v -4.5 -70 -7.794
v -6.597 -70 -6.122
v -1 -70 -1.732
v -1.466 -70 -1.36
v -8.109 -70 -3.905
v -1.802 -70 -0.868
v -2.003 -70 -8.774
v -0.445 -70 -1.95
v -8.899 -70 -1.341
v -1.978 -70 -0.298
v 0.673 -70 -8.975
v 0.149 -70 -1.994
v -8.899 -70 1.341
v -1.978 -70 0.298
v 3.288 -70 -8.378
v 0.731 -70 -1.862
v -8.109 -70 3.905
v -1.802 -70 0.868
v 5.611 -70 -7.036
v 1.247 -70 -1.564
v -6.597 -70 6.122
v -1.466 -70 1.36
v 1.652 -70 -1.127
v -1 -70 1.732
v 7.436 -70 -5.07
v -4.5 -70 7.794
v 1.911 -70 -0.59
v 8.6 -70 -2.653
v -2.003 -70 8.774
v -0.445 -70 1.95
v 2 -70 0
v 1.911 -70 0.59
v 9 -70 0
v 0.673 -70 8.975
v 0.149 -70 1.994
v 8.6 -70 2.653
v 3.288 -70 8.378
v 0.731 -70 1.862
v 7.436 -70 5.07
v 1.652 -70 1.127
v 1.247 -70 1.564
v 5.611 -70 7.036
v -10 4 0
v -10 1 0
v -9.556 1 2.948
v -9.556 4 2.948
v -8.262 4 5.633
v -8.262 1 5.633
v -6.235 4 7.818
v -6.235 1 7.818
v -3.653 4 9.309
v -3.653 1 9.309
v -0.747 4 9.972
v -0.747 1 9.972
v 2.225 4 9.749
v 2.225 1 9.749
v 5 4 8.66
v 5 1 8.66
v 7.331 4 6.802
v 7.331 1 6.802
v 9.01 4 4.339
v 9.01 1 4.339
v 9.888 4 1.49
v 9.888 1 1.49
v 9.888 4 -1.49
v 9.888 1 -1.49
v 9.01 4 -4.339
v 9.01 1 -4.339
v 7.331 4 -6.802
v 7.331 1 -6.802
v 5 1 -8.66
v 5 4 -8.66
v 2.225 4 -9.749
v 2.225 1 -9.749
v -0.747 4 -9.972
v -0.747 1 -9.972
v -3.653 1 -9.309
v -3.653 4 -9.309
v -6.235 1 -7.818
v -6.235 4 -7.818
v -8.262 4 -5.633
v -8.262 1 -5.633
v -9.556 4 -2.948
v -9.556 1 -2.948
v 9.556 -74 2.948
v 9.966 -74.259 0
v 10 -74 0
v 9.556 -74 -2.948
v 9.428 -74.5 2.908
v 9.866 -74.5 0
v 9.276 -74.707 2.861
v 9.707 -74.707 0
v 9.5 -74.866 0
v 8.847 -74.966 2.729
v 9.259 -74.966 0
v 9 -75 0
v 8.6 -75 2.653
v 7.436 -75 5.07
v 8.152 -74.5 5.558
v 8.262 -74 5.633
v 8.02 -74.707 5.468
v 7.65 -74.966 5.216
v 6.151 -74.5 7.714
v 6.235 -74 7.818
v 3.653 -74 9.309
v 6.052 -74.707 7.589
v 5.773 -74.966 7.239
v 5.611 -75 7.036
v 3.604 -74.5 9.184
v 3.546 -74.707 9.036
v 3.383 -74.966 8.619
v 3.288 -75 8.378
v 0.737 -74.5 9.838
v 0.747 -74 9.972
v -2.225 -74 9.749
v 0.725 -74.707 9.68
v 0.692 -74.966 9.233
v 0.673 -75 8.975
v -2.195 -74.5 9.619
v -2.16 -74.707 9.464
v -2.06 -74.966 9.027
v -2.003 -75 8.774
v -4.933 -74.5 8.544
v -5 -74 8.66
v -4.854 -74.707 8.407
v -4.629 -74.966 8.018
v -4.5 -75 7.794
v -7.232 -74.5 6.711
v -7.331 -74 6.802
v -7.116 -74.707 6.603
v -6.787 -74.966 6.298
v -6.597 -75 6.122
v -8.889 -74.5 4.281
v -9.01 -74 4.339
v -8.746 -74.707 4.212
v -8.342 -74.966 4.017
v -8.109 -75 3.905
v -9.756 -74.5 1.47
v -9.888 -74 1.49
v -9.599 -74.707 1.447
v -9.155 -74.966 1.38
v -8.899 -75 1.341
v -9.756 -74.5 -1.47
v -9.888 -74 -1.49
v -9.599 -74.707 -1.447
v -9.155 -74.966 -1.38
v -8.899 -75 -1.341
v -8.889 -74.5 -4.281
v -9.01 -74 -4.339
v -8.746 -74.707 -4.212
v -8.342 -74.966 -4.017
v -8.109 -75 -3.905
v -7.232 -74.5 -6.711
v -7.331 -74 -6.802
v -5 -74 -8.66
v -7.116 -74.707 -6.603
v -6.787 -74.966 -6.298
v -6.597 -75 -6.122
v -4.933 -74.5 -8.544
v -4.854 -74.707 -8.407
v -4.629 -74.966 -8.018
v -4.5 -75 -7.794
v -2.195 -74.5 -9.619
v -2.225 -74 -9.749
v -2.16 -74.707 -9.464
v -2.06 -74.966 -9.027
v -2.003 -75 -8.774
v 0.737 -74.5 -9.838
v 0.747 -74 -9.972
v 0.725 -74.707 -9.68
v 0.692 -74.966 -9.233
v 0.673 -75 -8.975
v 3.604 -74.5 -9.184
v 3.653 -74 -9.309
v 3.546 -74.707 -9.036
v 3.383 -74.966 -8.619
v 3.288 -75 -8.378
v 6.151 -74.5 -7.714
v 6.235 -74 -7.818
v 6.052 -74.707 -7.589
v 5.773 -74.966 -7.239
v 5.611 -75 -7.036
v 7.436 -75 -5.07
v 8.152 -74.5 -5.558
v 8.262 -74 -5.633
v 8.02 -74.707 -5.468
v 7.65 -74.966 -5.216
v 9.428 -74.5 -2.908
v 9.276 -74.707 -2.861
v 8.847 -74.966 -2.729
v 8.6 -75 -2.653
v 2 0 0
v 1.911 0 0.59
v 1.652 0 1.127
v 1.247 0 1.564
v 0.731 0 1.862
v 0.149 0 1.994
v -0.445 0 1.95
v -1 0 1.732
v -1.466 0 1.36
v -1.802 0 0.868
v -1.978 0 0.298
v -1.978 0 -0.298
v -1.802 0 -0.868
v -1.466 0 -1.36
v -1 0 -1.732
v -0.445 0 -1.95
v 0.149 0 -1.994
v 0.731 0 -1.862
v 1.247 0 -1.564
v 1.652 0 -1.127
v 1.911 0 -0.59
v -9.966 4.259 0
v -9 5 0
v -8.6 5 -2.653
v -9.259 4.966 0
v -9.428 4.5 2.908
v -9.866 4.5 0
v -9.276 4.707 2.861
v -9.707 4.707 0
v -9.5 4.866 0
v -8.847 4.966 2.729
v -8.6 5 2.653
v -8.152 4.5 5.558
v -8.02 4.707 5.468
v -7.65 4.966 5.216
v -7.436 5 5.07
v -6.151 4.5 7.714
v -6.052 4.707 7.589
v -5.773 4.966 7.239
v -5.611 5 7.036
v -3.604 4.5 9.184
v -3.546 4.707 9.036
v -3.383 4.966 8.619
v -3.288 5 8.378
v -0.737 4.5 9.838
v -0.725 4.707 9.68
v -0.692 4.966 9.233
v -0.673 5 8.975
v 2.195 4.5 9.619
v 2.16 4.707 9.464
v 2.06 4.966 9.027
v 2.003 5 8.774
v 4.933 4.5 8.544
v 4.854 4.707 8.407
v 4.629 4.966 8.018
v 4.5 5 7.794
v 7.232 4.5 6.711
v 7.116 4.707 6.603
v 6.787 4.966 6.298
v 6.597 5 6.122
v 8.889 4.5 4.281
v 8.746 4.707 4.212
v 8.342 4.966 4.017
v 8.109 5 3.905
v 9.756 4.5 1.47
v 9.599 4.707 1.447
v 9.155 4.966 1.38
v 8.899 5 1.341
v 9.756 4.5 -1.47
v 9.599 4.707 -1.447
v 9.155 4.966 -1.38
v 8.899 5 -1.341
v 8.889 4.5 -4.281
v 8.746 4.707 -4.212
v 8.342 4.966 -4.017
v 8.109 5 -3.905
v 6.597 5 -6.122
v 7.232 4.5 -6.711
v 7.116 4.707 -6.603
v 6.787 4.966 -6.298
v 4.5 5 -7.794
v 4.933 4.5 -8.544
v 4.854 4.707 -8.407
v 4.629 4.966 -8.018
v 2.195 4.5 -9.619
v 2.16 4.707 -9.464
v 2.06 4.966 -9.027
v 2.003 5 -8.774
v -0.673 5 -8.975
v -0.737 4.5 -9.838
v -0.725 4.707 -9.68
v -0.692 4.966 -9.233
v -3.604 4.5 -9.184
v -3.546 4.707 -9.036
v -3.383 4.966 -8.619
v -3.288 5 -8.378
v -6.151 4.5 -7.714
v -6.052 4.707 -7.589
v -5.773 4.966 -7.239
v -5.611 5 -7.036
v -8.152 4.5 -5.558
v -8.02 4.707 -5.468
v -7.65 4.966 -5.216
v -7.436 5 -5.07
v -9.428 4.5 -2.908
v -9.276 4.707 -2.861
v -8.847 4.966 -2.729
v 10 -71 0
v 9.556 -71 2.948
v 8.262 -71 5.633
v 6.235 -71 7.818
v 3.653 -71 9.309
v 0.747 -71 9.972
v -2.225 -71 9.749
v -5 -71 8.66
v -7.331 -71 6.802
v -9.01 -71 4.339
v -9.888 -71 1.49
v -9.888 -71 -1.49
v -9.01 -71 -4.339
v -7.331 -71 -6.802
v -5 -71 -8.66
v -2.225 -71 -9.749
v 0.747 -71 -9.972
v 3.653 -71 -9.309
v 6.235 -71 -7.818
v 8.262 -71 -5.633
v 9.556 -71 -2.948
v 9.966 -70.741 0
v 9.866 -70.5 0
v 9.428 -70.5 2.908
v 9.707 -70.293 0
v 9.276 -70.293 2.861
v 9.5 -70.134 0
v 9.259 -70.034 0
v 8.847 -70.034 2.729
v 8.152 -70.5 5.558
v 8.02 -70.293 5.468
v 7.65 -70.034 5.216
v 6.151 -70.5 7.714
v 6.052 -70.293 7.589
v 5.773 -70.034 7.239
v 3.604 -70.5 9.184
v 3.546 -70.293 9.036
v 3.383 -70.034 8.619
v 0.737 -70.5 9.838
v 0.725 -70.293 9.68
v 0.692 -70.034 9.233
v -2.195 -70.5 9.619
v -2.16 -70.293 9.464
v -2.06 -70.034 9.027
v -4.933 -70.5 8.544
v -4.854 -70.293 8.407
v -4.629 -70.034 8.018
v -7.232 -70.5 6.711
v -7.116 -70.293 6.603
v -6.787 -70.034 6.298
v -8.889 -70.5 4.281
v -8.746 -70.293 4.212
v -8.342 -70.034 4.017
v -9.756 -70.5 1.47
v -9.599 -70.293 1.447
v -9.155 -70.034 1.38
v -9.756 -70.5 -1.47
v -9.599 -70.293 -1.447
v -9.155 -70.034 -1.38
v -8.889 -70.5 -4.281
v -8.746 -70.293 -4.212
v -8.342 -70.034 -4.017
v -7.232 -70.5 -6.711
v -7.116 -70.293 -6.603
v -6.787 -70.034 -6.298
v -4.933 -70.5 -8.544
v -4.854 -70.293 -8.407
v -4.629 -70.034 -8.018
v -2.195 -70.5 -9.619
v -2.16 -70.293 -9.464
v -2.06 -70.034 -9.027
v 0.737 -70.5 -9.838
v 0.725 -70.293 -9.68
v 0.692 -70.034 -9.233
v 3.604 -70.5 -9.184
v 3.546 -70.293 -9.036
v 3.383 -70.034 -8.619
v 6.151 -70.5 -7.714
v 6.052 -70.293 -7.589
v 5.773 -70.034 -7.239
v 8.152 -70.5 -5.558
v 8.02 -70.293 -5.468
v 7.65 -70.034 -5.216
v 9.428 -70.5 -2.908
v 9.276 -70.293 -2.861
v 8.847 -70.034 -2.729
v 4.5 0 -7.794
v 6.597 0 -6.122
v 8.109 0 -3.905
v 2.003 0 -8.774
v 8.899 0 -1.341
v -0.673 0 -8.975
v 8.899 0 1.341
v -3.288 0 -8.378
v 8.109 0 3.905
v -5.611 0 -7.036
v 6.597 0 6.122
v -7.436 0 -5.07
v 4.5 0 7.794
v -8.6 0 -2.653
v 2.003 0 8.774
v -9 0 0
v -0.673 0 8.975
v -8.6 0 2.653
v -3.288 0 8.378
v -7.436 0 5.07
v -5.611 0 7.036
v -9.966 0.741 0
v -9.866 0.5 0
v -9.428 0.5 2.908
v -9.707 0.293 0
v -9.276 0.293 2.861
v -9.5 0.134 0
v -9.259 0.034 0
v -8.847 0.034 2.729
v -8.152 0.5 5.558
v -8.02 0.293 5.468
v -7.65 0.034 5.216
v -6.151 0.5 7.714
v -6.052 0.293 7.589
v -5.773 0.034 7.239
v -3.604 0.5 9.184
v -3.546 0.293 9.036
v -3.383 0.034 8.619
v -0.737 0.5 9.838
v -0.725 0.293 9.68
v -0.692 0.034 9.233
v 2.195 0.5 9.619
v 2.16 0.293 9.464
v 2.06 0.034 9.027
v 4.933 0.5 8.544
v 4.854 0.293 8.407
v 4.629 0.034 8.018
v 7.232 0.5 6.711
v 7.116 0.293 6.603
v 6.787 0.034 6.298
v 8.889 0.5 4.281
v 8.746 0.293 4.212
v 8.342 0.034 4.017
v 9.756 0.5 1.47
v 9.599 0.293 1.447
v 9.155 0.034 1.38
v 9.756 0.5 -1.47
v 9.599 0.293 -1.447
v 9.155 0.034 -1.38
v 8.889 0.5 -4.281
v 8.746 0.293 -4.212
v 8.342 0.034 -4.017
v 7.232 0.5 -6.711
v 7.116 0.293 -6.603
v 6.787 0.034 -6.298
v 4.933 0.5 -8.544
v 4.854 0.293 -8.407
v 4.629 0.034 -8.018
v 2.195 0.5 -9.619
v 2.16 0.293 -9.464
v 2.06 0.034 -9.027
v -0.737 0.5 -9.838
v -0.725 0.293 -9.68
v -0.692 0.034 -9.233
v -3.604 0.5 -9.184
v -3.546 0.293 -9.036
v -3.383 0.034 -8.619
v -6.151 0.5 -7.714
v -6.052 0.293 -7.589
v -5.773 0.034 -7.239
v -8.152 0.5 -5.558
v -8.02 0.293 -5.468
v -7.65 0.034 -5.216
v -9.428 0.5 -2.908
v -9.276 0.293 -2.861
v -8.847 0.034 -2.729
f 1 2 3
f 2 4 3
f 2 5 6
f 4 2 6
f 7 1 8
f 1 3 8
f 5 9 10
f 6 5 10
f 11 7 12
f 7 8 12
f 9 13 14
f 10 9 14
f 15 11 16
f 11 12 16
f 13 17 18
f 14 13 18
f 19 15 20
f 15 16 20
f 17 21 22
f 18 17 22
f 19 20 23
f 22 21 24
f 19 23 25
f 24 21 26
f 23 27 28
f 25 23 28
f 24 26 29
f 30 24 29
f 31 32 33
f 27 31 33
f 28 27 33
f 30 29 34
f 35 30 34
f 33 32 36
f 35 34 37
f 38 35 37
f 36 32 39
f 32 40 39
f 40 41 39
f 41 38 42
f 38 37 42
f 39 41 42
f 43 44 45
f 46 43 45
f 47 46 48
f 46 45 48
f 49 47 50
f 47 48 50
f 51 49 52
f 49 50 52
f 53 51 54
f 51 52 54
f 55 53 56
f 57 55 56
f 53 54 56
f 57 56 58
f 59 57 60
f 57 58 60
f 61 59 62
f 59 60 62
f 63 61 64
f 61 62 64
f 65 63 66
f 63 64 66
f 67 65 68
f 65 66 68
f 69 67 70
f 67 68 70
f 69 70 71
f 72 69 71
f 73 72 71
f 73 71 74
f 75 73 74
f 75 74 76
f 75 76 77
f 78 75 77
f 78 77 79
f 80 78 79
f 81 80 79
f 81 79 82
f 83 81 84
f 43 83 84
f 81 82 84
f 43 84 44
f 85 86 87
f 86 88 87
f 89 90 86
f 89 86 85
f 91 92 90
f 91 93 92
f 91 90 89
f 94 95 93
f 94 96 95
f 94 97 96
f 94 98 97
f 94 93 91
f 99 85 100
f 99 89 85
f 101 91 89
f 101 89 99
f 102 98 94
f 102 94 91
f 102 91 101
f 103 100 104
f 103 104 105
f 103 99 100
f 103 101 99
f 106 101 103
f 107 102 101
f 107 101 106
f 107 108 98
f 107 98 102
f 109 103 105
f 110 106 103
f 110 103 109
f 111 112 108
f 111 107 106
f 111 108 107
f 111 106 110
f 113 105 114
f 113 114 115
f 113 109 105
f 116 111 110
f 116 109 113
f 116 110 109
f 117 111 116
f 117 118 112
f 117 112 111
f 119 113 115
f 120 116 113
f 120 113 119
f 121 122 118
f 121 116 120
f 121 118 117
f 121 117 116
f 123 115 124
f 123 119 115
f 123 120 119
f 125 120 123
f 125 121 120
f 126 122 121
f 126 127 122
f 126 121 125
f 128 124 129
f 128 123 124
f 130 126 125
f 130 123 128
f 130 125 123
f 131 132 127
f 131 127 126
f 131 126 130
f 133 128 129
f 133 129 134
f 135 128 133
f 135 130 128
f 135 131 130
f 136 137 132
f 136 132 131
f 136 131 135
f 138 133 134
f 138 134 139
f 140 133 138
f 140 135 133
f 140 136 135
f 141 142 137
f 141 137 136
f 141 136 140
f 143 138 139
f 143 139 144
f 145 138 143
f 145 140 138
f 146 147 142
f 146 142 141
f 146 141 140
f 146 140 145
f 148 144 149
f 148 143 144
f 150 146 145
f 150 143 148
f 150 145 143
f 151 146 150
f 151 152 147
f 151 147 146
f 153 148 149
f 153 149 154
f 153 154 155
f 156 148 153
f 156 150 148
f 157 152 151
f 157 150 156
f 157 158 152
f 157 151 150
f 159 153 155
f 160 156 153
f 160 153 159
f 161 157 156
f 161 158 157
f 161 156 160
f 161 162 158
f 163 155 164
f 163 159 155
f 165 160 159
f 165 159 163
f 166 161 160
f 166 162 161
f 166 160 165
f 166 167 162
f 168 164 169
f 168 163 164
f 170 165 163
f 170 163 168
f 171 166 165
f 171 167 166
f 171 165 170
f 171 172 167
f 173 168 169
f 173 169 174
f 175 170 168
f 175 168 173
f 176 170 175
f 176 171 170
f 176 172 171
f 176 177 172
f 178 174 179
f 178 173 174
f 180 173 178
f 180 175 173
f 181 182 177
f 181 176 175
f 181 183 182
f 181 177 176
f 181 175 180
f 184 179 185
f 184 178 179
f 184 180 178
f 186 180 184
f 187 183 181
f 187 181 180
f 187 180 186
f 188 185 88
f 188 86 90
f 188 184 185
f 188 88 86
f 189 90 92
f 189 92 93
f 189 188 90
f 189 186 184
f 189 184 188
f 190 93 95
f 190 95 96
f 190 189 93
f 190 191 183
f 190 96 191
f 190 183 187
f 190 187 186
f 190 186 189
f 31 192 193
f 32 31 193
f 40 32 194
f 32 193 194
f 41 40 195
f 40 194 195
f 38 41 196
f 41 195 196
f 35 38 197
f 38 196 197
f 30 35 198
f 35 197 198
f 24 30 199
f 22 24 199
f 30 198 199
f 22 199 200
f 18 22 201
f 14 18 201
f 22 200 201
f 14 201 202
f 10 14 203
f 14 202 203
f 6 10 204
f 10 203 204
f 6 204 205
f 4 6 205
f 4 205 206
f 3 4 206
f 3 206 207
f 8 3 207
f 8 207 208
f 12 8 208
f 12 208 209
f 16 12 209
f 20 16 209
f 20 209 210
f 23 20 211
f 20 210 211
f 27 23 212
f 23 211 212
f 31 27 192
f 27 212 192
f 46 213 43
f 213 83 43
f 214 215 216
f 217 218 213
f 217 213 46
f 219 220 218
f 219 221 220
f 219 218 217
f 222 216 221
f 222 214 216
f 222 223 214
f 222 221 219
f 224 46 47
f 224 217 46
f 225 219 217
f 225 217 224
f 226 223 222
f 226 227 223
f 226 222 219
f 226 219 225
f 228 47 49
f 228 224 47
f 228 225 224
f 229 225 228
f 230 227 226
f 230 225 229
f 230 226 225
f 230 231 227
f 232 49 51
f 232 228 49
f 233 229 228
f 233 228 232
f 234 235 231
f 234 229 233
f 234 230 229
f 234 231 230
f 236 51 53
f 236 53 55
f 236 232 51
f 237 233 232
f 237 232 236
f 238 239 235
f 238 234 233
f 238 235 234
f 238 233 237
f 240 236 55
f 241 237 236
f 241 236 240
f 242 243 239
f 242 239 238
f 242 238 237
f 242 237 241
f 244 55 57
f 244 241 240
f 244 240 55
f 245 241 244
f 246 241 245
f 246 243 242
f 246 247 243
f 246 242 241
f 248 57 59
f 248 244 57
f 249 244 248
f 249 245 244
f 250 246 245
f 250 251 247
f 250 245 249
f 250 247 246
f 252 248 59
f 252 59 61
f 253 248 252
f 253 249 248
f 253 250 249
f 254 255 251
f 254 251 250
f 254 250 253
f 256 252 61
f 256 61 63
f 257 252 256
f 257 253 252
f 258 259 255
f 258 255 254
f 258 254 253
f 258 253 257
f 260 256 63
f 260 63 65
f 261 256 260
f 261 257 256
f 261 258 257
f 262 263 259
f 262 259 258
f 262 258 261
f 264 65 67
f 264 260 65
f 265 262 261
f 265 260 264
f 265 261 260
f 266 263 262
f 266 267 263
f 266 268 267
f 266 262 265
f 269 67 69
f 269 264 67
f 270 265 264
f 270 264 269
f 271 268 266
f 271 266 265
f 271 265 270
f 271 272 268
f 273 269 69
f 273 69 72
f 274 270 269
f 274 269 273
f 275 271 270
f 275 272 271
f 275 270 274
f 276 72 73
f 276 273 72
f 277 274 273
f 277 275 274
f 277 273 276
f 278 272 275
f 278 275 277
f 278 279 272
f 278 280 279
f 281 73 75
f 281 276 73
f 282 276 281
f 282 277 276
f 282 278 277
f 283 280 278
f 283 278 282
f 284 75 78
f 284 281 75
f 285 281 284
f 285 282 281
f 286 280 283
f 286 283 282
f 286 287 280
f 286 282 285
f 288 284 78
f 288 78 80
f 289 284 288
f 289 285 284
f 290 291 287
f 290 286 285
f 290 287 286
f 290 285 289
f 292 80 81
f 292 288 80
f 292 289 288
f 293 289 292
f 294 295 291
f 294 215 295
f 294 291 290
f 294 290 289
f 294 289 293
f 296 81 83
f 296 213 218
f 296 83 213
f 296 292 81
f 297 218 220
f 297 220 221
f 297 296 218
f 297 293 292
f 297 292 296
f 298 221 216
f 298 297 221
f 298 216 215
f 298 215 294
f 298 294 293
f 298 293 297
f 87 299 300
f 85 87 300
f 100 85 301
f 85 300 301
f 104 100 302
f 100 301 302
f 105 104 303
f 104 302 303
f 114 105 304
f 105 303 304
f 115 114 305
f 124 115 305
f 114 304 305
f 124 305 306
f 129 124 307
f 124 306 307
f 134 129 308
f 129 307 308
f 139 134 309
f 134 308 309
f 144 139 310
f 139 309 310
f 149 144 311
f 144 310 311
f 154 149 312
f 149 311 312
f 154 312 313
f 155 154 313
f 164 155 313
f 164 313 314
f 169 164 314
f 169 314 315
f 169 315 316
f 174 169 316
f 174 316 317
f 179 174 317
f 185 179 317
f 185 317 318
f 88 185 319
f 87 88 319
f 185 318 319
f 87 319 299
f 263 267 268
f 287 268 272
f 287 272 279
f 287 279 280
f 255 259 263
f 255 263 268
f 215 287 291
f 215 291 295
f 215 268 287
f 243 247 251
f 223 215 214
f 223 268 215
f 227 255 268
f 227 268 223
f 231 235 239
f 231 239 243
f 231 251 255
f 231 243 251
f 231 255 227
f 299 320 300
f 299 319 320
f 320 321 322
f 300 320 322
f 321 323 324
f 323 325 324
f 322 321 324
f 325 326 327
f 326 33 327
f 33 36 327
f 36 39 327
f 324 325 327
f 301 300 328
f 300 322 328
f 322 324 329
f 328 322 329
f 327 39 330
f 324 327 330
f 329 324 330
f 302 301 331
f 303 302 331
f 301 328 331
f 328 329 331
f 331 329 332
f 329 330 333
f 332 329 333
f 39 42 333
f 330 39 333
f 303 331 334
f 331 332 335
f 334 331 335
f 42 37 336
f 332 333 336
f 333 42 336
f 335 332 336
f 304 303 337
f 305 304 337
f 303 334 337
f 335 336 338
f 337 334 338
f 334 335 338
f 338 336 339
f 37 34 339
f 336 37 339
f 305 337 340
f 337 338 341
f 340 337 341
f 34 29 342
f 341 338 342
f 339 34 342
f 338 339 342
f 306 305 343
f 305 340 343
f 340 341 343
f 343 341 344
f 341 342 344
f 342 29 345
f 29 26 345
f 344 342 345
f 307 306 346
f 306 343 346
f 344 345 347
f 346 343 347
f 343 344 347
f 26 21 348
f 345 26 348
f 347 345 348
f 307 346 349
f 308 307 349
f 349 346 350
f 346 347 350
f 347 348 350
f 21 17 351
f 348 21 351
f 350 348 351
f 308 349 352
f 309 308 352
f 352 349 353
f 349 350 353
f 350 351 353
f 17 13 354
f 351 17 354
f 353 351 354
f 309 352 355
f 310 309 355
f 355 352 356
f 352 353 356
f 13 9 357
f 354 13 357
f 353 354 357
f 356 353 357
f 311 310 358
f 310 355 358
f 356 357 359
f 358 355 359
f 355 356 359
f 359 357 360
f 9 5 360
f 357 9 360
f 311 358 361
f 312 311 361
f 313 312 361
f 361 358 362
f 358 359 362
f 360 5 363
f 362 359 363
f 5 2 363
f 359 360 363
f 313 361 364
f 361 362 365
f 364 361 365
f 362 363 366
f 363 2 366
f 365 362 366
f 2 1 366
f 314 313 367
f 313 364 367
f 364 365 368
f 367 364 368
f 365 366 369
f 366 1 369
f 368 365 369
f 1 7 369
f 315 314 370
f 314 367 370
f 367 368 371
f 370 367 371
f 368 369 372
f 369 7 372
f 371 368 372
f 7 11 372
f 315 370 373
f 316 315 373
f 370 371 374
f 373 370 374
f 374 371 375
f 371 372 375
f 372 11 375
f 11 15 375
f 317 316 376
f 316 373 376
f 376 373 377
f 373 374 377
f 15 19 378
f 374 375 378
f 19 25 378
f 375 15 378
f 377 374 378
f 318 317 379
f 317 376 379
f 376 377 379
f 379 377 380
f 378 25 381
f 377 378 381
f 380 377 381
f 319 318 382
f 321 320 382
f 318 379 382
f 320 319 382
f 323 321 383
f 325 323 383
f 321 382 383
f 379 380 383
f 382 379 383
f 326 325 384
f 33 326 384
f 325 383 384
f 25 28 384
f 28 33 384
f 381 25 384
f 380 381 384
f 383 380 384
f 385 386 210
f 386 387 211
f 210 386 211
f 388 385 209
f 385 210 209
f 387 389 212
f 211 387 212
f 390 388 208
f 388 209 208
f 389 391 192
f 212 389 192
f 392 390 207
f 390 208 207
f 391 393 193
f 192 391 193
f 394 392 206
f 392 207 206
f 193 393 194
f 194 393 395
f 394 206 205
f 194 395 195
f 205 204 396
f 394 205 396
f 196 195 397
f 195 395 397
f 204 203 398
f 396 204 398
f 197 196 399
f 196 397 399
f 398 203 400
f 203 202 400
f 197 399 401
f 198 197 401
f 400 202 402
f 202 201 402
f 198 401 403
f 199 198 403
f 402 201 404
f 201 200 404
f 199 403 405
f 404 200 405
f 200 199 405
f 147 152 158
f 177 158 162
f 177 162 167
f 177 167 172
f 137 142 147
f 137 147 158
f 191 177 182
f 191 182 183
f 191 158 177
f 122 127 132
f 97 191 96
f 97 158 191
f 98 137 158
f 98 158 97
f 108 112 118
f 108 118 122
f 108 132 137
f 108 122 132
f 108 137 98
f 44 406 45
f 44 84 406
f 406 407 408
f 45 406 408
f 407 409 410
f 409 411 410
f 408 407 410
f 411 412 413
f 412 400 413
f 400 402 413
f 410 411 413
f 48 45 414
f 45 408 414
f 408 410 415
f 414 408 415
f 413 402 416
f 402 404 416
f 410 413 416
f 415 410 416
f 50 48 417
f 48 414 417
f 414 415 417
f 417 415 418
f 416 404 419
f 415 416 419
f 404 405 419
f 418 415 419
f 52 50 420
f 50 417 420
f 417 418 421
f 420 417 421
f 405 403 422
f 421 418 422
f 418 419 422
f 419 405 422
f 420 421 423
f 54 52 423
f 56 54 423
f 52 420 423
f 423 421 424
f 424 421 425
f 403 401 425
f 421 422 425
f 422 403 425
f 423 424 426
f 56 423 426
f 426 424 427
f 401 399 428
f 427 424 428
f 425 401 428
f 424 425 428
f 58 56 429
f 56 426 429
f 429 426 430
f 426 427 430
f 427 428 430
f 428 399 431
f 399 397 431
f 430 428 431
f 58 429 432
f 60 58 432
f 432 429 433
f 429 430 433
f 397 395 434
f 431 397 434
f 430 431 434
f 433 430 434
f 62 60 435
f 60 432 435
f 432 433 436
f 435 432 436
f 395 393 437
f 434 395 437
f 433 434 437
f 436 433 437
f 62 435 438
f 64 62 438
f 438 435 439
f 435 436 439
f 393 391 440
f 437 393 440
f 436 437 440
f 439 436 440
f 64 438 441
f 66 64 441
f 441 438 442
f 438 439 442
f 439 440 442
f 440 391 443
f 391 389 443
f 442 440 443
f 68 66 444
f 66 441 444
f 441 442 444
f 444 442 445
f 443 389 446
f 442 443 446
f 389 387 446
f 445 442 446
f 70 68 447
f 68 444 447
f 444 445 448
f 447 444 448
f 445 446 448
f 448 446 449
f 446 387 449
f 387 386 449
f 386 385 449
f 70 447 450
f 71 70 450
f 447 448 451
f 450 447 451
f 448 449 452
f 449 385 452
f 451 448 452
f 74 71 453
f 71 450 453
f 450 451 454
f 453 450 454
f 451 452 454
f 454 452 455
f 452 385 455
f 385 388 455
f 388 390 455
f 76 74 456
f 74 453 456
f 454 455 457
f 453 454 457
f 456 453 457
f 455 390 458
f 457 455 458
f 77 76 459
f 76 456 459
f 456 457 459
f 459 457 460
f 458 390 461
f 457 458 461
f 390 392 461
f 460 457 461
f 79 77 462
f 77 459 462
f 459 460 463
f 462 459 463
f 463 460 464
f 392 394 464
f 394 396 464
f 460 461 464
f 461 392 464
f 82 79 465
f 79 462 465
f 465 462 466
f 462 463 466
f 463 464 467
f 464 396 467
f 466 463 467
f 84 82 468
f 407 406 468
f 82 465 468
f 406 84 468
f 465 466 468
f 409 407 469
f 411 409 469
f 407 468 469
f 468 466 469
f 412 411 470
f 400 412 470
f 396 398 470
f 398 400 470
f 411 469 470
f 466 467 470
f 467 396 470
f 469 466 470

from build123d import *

# Parameters (mm, degrees)
F0_R     = 2
F1_DEPTH = 70
F2_R     = 10
F3_DEPTH = 5
F4_R     = 1
F5_R     = 10
F5_R_2   = 2
F6_DEPTH = 5
F7_R     = 1


# Not quite as in the source:
# - a feature names something its author has since deleted; it is built from what else it names


with BuildPart() as f1:
    # F0 (on Front) → F1 (new body)
    with BuildSketch(Plane.XZ):
        Circle(F0_R)
    extrude(amount=F1_DEPTH)

    # F2 (on face) → F3 (join)
    with BuildSketch(Plane.XZ.offset(70)):
        Circle(F2_R)
    extrude(amount=F3_DEPTH)

    # F4
    f4_edges = [f1.edges().sort_by_distance(p)[0] for p in [
        (-10, -70, 0),
        (-10, -75, 0),
    ]]
    fillet(f4_edges, radius=F4_R)

    # F5 (on face) → F6 (join)
    with BuildSketch(Plane(origin=(0, 0, 0), x_dir=(-1, 0, 0), z_dir=(0, 1, 0))):
        Circle(F5_R)
        Circle(F5_R_2, mode=Mode.SUBTRACT)
        Circle(F5_R_2)
    extrude(amount=F6_DEPTH)

    # F7
    f7_edges = [f1.edges().sort_by_distance(p)[0] for p in [
        (10, 0, 0),
        (10, 5, 0),
    ]]
    fillet(f7_edges, radius=F7_R)


solid = f1.part
